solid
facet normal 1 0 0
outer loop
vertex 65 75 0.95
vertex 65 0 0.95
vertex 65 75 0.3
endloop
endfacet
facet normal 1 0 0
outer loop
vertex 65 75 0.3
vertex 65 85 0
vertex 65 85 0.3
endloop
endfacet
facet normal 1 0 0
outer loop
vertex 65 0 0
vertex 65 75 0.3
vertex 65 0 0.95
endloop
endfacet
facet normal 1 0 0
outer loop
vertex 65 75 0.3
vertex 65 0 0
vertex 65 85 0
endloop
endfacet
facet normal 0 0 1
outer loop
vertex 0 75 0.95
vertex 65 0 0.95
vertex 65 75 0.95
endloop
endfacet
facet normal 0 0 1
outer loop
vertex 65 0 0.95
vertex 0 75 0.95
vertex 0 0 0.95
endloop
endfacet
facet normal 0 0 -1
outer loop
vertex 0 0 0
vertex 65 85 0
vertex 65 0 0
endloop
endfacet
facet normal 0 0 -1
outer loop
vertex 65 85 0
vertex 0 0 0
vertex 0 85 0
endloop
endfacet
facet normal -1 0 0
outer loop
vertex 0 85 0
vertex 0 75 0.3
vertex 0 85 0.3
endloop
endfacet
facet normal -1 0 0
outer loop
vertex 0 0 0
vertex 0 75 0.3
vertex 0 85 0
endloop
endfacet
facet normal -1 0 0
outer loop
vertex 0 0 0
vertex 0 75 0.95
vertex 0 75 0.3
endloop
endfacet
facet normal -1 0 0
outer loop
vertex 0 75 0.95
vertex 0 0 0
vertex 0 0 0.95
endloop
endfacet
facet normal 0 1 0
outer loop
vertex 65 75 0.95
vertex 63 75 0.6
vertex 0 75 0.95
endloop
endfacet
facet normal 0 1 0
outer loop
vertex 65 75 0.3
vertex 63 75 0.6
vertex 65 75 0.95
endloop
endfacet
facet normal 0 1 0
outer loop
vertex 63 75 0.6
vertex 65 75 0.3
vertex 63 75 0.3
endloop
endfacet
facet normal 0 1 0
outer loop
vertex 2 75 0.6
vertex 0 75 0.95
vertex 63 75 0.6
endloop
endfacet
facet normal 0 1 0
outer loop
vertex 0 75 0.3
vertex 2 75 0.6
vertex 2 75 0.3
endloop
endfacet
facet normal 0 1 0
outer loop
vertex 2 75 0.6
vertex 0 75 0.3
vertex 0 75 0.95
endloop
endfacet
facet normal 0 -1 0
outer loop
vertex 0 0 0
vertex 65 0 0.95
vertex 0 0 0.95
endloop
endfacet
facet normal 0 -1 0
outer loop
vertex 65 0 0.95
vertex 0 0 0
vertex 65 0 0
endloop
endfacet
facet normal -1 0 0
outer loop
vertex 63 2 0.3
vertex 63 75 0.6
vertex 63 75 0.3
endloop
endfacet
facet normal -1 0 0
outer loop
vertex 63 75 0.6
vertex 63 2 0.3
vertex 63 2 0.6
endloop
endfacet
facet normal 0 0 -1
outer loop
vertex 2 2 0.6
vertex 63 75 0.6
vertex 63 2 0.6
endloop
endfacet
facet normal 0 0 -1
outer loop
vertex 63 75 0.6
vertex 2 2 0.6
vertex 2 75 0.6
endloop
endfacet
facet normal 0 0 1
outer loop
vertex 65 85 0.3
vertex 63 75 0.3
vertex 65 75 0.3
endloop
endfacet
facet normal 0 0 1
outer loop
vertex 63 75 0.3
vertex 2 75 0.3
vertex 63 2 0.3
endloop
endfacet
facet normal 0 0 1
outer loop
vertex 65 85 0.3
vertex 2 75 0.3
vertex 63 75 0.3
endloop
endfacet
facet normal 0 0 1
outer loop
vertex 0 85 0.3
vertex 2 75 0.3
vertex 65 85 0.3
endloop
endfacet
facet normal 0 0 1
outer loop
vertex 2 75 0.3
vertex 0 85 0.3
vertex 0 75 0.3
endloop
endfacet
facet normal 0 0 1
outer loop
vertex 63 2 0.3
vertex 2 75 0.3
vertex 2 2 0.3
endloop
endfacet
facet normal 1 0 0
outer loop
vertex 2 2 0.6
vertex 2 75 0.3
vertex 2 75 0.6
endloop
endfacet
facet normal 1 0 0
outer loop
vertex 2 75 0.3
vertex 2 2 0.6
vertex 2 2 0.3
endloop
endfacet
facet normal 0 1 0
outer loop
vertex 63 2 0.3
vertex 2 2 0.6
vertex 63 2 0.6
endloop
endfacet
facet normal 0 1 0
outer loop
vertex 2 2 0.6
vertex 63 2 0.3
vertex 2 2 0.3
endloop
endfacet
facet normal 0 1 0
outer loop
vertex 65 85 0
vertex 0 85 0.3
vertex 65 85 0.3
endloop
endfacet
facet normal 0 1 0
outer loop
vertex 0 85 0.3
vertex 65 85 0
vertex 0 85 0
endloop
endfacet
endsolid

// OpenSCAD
x=65;
y=75;
cutoutZ=0.3;
bottom=0.3;
seam=2;

cube([x,y+10,bottom]);
difference(){
    cube([x,y,cutoutZ+bottom+0.3+0.05]);
    translate([seam,seam,bottom])
    cube([x-2*seam,y,cutoutZ]);
}
